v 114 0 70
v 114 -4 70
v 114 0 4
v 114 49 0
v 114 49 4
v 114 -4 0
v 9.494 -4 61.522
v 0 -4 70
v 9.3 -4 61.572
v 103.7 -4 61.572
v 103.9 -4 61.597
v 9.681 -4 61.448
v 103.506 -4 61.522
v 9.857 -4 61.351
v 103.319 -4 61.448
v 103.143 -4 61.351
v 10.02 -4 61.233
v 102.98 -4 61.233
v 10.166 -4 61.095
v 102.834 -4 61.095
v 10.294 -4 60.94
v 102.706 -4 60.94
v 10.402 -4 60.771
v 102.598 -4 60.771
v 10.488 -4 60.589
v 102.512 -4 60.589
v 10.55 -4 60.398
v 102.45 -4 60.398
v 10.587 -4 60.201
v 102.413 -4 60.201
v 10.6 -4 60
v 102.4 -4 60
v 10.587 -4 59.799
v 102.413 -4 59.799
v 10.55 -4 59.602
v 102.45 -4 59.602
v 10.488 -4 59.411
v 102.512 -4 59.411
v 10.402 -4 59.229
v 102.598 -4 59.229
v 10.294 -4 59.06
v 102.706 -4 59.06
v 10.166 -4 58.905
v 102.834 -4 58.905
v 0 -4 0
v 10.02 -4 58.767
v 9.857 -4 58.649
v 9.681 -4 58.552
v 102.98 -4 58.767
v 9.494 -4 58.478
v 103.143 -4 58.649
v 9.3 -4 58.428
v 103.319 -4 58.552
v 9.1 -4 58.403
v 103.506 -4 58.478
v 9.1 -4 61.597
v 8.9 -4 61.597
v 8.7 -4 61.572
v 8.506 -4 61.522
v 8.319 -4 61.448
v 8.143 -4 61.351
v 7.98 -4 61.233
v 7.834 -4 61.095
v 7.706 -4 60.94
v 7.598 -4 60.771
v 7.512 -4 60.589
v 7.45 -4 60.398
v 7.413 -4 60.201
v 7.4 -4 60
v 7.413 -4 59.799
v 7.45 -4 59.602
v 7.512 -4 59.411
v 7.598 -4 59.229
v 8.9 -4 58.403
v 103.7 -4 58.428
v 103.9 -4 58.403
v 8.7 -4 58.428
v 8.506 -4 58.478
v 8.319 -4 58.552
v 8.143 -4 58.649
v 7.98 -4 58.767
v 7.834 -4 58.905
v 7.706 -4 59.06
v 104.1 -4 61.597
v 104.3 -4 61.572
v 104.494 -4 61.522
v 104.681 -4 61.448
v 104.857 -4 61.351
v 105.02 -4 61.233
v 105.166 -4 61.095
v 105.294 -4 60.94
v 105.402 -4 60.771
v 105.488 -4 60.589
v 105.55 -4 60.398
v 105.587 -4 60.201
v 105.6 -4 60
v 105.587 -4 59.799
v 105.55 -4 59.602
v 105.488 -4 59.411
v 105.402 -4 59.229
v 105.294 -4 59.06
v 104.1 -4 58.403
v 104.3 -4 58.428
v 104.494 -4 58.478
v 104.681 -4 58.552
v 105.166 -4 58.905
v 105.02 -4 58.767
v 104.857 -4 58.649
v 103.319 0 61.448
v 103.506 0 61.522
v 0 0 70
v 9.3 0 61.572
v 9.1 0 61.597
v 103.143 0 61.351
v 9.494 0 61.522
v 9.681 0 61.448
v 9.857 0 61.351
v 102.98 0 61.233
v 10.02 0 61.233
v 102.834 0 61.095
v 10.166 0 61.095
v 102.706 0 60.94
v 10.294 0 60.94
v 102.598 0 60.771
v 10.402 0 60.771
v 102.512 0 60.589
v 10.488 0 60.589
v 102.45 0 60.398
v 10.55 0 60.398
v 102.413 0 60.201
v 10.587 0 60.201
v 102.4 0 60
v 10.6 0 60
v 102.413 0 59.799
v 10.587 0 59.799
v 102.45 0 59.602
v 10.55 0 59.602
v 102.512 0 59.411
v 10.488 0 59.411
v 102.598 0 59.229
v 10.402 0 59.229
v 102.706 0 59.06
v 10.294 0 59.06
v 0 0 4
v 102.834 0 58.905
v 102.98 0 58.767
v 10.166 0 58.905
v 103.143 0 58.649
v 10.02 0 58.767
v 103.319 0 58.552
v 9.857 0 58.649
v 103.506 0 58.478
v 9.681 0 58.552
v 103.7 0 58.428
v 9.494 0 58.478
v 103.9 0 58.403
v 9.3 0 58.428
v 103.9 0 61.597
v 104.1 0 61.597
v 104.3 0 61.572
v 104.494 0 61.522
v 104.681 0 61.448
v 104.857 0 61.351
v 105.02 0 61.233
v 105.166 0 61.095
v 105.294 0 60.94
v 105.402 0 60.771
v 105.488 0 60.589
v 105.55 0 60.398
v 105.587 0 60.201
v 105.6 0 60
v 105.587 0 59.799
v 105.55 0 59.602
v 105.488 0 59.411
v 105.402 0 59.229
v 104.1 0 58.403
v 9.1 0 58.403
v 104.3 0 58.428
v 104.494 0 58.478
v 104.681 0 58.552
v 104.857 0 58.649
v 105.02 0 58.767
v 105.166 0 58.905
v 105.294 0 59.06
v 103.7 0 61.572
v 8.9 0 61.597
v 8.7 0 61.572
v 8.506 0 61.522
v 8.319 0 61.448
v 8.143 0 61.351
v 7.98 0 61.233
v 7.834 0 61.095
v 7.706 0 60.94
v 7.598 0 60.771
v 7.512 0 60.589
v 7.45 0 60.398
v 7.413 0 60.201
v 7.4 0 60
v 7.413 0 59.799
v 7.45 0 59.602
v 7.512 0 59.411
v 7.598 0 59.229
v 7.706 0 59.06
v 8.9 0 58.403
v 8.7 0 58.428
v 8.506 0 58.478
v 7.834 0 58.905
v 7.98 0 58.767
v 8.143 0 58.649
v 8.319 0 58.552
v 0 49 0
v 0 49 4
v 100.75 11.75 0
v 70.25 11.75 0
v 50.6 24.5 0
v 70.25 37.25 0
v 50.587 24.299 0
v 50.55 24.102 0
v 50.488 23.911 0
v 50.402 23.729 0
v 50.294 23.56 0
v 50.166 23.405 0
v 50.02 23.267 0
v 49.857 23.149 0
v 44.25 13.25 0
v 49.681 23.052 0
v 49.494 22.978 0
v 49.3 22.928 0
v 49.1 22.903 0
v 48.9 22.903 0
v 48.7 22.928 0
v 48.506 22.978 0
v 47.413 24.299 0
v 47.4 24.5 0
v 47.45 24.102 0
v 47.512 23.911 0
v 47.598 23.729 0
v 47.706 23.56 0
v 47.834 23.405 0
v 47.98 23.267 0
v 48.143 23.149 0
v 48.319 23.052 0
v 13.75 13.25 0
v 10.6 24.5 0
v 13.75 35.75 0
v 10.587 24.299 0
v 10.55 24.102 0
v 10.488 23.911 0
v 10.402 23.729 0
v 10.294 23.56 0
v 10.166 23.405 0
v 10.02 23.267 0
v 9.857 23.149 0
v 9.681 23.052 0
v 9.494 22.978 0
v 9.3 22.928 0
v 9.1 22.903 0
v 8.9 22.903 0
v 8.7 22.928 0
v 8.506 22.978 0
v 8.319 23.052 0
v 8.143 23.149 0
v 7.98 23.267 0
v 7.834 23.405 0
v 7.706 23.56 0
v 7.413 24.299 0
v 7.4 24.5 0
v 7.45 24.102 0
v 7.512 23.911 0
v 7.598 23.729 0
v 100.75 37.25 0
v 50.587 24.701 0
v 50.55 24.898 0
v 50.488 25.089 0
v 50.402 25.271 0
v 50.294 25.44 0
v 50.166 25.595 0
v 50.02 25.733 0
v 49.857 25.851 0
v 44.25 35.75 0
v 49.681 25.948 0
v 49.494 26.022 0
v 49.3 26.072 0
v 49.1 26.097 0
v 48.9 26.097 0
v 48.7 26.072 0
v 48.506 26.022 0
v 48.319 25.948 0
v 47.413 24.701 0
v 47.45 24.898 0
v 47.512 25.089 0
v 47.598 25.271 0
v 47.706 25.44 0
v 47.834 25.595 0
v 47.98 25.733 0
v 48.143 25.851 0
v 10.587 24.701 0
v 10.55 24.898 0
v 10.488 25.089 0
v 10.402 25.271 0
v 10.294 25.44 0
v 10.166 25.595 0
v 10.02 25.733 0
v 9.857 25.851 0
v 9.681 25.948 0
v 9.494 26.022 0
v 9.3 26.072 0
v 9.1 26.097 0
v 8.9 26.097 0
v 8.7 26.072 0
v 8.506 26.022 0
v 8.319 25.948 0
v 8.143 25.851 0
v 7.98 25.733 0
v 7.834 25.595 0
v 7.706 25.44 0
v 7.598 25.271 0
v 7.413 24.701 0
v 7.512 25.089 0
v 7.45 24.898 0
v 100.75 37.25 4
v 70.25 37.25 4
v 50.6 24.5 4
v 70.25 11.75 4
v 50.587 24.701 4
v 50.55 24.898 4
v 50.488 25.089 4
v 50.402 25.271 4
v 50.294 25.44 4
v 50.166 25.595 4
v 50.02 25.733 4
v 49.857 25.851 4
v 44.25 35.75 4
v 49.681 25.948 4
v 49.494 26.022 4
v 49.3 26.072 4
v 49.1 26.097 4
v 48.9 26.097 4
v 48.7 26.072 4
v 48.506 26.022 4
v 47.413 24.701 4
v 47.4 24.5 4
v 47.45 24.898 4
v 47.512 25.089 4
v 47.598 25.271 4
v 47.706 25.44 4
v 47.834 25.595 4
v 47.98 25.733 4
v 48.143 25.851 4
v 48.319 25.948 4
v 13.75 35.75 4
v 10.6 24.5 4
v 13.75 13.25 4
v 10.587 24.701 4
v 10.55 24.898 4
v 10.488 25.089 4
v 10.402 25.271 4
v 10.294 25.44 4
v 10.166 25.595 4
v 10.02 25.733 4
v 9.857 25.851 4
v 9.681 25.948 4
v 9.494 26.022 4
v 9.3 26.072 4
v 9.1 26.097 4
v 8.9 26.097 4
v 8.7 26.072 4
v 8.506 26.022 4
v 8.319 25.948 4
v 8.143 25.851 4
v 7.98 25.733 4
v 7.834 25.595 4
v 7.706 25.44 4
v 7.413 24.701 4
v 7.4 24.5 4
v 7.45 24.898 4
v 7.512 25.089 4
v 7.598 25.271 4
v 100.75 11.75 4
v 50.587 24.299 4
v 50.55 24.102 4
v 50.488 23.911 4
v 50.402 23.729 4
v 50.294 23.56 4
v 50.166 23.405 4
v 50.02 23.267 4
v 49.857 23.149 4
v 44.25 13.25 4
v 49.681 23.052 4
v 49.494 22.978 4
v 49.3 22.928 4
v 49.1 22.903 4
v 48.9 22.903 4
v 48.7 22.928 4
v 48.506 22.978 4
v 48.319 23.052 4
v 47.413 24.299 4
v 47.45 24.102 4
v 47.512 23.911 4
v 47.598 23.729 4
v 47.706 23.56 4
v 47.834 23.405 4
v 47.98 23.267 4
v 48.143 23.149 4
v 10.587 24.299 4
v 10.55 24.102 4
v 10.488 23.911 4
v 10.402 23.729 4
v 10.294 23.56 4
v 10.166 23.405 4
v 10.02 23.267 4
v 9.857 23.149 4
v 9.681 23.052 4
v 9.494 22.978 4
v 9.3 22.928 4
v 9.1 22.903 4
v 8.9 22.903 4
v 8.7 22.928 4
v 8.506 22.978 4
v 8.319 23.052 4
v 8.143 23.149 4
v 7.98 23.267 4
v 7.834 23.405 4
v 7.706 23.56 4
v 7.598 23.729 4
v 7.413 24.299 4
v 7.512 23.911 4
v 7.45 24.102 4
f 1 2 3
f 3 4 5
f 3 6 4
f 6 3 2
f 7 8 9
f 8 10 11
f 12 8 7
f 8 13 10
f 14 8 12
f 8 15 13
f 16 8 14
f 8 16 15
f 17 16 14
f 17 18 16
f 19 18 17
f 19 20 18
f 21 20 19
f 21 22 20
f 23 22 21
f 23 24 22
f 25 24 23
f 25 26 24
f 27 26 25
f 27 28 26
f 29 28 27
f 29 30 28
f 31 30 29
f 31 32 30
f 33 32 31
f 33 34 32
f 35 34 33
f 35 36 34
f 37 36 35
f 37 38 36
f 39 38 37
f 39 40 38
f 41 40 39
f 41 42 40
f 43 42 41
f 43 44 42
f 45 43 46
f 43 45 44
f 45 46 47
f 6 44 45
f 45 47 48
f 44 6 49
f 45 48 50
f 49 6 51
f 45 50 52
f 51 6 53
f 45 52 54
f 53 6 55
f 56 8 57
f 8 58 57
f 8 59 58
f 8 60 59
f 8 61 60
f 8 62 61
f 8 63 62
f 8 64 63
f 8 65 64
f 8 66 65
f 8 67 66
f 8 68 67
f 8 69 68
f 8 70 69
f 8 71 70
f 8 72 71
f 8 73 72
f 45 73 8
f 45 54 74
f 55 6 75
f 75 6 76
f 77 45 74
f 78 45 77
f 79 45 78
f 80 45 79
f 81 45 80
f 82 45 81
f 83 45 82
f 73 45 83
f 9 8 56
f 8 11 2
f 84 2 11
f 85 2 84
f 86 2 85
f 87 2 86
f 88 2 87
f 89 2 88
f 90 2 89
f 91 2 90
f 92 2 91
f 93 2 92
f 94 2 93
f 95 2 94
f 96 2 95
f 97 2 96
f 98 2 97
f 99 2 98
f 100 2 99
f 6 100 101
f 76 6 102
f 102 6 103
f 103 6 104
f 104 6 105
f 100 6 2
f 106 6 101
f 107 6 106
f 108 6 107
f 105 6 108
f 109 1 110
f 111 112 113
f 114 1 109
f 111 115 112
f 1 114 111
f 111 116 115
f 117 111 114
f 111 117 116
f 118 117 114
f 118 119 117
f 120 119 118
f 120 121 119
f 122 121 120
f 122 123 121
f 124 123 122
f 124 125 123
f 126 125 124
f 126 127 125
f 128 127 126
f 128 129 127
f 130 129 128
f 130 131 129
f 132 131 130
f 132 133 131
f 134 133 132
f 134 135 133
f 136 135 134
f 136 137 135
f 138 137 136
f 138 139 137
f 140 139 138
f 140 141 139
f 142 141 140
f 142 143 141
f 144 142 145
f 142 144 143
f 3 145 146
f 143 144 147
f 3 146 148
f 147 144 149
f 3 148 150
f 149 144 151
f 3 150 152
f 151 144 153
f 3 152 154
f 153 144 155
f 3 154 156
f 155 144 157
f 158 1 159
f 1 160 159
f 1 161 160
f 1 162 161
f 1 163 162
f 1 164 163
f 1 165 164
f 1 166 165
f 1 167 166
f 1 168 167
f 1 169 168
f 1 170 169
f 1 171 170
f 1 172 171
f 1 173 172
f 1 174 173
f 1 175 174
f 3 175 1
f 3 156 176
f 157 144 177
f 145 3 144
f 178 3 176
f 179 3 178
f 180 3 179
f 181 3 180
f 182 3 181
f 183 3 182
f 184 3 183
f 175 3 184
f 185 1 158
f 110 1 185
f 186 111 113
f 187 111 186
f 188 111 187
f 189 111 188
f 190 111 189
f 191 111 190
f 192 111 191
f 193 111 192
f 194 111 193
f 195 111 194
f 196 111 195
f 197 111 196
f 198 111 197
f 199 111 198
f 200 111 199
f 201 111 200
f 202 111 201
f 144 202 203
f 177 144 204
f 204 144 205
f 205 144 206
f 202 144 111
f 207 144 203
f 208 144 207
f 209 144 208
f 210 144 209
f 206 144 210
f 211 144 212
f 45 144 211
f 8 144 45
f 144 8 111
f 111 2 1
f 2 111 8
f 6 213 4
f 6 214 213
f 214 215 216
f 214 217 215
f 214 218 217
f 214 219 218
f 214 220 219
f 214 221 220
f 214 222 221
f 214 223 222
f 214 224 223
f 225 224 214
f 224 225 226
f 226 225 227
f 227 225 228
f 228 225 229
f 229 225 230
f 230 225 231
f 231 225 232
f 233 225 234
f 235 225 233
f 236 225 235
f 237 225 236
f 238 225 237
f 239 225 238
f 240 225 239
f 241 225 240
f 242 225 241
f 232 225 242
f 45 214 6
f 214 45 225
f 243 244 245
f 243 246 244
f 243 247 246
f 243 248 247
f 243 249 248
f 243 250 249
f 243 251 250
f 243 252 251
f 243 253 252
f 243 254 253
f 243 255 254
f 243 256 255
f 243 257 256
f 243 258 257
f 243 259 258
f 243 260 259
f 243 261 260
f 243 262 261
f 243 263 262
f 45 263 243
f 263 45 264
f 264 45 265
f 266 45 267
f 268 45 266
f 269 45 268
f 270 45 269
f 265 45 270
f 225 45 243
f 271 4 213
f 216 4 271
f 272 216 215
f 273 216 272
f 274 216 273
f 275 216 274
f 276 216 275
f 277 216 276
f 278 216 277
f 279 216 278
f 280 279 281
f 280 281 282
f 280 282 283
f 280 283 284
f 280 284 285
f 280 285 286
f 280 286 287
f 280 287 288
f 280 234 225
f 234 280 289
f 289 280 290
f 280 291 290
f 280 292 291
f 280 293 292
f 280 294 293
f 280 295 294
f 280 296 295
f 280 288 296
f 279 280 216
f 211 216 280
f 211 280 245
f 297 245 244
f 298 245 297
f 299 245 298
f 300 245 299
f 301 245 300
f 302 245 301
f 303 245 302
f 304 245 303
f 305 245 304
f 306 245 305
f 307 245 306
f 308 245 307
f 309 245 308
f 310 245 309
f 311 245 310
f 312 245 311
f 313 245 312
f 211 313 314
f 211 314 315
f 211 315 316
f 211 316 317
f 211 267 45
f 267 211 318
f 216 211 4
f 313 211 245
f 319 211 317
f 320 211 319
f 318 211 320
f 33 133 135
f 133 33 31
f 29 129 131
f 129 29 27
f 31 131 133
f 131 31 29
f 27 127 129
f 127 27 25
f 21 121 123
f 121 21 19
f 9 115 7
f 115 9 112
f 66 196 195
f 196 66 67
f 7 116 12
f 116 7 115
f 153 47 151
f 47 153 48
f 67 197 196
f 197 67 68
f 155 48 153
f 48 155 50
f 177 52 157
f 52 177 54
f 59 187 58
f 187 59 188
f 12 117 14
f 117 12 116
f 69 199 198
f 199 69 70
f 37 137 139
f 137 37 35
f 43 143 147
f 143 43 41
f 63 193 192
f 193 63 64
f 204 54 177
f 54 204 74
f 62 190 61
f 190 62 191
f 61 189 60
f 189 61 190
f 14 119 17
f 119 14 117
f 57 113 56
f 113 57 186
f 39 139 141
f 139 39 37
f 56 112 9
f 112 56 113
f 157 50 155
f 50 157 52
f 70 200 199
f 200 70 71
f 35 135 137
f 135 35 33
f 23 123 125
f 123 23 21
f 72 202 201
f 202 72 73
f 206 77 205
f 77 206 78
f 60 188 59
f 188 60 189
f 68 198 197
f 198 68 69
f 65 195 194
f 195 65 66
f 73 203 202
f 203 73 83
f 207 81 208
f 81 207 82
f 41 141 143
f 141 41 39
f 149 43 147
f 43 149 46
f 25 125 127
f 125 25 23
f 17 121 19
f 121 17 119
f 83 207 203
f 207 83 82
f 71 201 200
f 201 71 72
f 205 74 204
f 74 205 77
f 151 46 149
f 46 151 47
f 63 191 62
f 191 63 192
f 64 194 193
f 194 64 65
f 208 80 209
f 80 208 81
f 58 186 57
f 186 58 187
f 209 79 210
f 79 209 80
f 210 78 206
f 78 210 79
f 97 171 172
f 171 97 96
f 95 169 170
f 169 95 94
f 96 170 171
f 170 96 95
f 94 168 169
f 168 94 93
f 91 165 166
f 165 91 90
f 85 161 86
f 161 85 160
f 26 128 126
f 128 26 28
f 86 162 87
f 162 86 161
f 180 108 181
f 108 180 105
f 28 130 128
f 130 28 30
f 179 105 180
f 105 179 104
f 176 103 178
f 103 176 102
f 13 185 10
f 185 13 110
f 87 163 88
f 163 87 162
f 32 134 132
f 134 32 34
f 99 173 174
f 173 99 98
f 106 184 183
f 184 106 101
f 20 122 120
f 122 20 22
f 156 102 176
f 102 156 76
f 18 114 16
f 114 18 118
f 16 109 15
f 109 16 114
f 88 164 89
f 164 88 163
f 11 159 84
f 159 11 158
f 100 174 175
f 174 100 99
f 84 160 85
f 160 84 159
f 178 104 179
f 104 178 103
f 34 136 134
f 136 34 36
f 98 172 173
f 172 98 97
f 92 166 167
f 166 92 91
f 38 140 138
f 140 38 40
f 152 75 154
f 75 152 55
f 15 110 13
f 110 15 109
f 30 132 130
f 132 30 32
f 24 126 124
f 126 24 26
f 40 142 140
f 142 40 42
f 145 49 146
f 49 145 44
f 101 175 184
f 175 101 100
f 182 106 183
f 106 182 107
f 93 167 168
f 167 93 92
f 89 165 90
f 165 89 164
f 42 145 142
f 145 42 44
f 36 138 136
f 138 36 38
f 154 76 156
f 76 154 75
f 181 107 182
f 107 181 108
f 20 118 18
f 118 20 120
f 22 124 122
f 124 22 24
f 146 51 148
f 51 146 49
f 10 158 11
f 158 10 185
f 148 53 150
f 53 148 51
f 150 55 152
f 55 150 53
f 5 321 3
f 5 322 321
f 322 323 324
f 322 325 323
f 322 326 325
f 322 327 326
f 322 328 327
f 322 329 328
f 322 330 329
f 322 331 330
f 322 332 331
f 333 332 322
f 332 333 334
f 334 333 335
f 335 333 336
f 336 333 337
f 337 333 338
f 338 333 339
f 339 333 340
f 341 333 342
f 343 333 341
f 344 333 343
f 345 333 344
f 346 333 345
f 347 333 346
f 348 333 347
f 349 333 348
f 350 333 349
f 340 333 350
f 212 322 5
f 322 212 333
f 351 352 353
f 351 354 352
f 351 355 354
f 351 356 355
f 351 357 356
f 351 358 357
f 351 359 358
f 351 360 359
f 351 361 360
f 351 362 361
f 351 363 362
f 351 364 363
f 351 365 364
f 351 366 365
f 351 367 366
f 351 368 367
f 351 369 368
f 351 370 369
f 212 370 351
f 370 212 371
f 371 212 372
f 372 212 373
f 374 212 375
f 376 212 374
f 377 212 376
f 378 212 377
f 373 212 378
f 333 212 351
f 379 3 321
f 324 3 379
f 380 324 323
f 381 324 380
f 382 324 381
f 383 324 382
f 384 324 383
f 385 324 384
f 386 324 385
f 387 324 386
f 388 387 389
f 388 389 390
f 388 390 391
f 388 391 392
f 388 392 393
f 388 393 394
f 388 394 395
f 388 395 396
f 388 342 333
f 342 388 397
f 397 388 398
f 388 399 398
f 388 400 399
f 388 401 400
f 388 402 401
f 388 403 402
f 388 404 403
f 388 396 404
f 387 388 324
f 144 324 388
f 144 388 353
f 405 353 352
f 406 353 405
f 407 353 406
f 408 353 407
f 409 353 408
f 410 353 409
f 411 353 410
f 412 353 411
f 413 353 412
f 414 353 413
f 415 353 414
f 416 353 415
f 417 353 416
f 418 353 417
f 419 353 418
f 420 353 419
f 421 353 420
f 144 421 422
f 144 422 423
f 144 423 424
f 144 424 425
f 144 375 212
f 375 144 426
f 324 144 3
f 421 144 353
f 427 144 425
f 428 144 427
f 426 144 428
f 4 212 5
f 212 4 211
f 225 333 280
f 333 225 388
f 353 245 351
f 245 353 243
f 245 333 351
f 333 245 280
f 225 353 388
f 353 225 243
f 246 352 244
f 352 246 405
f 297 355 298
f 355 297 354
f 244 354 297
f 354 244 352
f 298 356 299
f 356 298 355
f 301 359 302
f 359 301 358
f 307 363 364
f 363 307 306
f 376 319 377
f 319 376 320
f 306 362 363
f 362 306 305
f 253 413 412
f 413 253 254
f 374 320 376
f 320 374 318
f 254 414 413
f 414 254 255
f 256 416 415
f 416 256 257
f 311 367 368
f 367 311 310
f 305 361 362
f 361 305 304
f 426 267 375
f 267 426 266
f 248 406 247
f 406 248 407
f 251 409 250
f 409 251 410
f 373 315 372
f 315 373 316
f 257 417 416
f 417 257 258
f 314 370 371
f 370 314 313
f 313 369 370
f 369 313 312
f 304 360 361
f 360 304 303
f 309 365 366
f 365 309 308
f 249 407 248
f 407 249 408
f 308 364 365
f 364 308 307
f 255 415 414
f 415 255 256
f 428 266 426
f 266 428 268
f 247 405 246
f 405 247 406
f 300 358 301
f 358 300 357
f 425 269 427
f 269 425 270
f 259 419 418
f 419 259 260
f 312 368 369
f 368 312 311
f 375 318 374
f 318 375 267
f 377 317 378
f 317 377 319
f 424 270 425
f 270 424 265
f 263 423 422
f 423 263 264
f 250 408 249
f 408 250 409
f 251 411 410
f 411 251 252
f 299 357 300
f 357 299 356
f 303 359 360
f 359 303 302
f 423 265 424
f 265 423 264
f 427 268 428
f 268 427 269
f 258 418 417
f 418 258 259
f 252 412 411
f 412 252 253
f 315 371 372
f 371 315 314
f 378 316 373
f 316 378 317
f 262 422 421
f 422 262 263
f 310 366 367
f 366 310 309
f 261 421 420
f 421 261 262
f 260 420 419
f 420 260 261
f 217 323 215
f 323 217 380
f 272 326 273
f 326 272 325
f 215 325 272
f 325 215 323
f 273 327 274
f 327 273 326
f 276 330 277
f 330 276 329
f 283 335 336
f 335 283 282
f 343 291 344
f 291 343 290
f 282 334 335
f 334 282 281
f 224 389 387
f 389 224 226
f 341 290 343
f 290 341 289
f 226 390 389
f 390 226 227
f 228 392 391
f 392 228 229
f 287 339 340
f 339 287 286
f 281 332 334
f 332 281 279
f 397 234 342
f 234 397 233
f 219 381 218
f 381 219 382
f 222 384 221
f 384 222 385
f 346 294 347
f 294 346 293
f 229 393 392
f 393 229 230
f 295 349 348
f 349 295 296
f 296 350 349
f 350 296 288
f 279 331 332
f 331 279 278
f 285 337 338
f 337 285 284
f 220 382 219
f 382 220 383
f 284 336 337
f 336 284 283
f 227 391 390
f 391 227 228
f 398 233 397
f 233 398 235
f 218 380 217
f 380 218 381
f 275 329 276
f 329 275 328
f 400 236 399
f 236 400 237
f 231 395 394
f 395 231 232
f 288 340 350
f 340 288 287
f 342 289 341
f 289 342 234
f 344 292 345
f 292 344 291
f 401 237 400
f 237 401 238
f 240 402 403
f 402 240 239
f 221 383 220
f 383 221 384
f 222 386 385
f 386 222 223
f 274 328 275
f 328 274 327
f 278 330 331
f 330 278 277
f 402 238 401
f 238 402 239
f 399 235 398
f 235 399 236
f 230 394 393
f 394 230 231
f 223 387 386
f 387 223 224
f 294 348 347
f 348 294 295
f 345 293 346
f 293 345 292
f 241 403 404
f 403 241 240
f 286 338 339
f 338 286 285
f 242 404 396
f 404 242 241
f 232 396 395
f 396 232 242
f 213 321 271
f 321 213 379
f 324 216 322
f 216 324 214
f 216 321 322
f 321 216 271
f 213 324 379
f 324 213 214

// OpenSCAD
// iTopie RepRap - Main file
//
// @version 1.1.0
// @license GPLv3
// @docs    http://reprap.org/wiki/ITopie  
// @sources https://github.com/lautr3k/RepRap-iTopie 
// @author  Sébastien Mischler <skarab>
// @author  http://www.onlfait.ch
//
// @upddate 2015-06-27 <skarab> first write
// @update  2015-07-02 <skarab> add: vertical plate
// @upddate 2015-07-03 <skarab> add: feet
include <config.scad>

psu_width                  = 114;                        // width of PSU
psu_height                 = 49;                         // height of PSU
psu_socket_hole_width      = 30.5;                       // width of PSU socket hole
psu_socket_hole_height     = 22.5;                       // height of PSU socket hole
psu_socket_mount_spacing   = 40;                         // distance between holes for socket mount bolts
psu_socket_mount_hole_r    = m3_screw_radius;            // radius of socket mount holes
psu_switch_hole_width      = 30.5;                       // width of PSU socket hole
psu_switch_hole_height     = 25.5;                       // height of PSU socket hole
psu_mount_top_hole_margin  = 9;                          // distance from side of plastic PSU socket and switch mount to top mounting hole
psu_mount_thickness = 4;                                 // thickness of plastic PSU socket and switch mount

rotate([90,0,0])
difference(){
    cube([psu_width,psu_margin[0]+10,psu_mount_thickness]);
    translate([psu_mount_top_hole_margin, psu_margin[0], 0]) cylinder(h=psu_mount_thickness,r=psu_socket_mount_hole_r);
    translate([psu_mount_top_hole_margin + psu_mount_holes_spacing_y, psu_margin[0], 0]) cylinder(h=psu_mount_thickness,r=psu_socket_mount_hole_r);
};

difference(){
    cube([psu_width,psu_height,psu_mount_thickness]);
    translate([psu_mount_top_hole_margin + psu_socket_mount_spacing/2,psu_height/2,0])
    cube([psu_socket_hole_width,psu_socket_hole_height,psu_mount_thickness*2],center=true);
    translate([psu_mount_top_hole_margin,psu_height/2,0]) cylinder(h=psu_mount_thickness,r=psu_socket_mount_hole_r);
    translate([psu_mount_top_hole_margin + psu_socket_mount_spacing,psu_height/2,0]) cylinder(h=psu_mount_thickness,r=psu_socket_mount_hole_r);
    translate([3*psu_width/4,psu_height/2,0])
    cube([psu_switch_hole_width,psu_switch_hole_height,psu_mount_thickness*2],center=true);
};
